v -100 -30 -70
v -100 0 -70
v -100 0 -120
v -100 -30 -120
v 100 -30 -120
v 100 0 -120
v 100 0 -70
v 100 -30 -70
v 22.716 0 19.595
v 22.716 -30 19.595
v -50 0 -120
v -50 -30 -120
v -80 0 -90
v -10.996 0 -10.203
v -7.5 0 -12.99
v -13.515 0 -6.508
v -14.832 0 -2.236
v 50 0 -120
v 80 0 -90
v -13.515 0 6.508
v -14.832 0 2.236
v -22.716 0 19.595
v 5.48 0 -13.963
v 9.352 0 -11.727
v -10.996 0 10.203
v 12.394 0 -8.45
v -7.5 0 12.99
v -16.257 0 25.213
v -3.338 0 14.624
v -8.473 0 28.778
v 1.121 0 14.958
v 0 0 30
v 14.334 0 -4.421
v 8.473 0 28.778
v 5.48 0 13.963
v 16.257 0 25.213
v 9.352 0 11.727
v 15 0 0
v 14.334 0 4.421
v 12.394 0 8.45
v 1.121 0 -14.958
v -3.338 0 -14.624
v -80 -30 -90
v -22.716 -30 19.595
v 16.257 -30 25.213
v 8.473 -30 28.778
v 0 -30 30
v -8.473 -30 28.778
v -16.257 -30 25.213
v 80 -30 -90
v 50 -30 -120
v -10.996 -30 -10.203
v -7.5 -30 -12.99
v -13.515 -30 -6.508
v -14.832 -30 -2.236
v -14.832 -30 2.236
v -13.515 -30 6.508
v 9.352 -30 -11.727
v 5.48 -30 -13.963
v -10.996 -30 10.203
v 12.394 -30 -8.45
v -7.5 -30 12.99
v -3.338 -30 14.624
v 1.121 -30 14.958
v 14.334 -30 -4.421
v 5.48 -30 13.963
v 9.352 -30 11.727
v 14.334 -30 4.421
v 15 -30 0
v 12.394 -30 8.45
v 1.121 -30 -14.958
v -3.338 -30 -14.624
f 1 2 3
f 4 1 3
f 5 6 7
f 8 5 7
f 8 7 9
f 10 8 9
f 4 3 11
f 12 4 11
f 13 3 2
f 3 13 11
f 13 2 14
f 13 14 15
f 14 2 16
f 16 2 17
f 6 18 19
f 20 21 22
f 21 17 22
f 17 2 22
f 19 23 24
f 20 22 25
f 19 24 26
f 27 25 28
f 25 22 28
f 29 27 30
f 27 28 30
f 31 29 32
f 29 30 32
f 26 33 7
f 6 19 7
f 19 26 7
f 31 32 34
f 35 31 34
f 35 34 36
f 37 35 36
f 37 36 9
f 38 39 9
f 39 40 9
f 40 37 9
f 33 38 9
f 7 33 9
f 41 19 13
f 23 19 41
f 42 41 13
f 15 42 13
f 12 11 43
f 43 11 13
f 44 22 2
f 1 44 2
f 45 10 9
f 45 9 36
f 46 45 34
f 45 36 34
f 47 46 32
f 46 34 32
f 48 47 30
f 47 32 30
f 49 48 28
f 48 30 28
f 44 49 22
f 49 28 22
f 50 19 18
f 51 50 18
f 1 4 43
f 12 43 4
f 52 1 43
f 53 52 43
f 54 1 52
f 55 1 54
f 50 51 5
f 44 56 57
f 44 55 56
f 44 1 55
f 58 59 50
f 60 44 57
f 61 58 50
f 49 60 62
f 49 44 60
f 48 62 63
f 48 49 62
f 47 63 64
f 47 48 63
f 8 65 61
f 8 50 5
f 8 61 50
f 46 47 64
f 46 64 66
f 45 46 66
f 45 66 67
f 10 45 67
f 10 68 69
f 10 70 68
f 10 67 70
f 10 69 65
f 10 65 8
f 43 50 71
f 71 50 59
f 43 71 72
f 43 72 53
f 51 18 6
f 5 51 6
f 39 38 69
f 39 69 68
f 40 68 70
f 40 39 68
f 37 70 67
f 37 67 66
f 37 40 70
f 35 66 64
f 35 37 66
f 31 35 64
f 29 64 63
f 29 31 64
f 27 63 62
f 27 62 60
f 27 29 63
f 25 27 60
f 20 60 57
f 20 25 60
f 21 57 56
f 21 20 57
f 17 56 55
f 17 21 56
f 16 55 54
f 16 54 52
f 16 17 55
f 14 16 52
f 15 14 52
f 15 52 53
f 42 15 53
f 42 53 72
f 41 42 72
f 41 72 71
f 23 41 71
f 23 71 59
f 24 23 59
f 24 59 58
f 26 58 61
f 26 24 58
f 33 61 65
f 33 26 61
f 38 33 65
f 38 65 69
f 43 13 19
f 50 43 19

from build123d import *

# Parameters (mm, degrees)
F0_R     = 15
F1_DEPTH = 30


with BuildPart() as f1:
    # F0 (on Front) → F1 (new body)
    with BuildSketch(Plane.XZ):
        with BuildLine():
            ThreePointArc((-22.716467, 19.594952), (-10.452416, -28.120224), (30, 0))
            ThreePointArc((30, 0), (28.120224, 10.452416), (22.716467, 19.594952))
            ThreePointArc((22.716467, 19.594952), (0, 30), (-22.716467, 19.594952))
        make_face()
        Circle(F0_R, mode=Mode.SUBTRACT)
        with BuildLine():
            ThreePointArc((22.716467, 19.594952), (28.120224, 10.452416), (30, 0))
            ThreePointArc((30, 0), (-10.452416, -28.120224), (-22.716467, 19.594952))
            Line((-22.716467, 19.594952), (-100, -70))
            Line((-100, -70), (100, -70))
            Line((100, -70), (22.716467, 19.594952))
        make_face()
        Polygon((100, -120), (100, -70), (-100, -70), (-100, -120), (-50, -120), (-80, -90), (80, -90), (50, -120), align=None)
    extrude(amount=F1_DEPTH)


solid = f1.part
